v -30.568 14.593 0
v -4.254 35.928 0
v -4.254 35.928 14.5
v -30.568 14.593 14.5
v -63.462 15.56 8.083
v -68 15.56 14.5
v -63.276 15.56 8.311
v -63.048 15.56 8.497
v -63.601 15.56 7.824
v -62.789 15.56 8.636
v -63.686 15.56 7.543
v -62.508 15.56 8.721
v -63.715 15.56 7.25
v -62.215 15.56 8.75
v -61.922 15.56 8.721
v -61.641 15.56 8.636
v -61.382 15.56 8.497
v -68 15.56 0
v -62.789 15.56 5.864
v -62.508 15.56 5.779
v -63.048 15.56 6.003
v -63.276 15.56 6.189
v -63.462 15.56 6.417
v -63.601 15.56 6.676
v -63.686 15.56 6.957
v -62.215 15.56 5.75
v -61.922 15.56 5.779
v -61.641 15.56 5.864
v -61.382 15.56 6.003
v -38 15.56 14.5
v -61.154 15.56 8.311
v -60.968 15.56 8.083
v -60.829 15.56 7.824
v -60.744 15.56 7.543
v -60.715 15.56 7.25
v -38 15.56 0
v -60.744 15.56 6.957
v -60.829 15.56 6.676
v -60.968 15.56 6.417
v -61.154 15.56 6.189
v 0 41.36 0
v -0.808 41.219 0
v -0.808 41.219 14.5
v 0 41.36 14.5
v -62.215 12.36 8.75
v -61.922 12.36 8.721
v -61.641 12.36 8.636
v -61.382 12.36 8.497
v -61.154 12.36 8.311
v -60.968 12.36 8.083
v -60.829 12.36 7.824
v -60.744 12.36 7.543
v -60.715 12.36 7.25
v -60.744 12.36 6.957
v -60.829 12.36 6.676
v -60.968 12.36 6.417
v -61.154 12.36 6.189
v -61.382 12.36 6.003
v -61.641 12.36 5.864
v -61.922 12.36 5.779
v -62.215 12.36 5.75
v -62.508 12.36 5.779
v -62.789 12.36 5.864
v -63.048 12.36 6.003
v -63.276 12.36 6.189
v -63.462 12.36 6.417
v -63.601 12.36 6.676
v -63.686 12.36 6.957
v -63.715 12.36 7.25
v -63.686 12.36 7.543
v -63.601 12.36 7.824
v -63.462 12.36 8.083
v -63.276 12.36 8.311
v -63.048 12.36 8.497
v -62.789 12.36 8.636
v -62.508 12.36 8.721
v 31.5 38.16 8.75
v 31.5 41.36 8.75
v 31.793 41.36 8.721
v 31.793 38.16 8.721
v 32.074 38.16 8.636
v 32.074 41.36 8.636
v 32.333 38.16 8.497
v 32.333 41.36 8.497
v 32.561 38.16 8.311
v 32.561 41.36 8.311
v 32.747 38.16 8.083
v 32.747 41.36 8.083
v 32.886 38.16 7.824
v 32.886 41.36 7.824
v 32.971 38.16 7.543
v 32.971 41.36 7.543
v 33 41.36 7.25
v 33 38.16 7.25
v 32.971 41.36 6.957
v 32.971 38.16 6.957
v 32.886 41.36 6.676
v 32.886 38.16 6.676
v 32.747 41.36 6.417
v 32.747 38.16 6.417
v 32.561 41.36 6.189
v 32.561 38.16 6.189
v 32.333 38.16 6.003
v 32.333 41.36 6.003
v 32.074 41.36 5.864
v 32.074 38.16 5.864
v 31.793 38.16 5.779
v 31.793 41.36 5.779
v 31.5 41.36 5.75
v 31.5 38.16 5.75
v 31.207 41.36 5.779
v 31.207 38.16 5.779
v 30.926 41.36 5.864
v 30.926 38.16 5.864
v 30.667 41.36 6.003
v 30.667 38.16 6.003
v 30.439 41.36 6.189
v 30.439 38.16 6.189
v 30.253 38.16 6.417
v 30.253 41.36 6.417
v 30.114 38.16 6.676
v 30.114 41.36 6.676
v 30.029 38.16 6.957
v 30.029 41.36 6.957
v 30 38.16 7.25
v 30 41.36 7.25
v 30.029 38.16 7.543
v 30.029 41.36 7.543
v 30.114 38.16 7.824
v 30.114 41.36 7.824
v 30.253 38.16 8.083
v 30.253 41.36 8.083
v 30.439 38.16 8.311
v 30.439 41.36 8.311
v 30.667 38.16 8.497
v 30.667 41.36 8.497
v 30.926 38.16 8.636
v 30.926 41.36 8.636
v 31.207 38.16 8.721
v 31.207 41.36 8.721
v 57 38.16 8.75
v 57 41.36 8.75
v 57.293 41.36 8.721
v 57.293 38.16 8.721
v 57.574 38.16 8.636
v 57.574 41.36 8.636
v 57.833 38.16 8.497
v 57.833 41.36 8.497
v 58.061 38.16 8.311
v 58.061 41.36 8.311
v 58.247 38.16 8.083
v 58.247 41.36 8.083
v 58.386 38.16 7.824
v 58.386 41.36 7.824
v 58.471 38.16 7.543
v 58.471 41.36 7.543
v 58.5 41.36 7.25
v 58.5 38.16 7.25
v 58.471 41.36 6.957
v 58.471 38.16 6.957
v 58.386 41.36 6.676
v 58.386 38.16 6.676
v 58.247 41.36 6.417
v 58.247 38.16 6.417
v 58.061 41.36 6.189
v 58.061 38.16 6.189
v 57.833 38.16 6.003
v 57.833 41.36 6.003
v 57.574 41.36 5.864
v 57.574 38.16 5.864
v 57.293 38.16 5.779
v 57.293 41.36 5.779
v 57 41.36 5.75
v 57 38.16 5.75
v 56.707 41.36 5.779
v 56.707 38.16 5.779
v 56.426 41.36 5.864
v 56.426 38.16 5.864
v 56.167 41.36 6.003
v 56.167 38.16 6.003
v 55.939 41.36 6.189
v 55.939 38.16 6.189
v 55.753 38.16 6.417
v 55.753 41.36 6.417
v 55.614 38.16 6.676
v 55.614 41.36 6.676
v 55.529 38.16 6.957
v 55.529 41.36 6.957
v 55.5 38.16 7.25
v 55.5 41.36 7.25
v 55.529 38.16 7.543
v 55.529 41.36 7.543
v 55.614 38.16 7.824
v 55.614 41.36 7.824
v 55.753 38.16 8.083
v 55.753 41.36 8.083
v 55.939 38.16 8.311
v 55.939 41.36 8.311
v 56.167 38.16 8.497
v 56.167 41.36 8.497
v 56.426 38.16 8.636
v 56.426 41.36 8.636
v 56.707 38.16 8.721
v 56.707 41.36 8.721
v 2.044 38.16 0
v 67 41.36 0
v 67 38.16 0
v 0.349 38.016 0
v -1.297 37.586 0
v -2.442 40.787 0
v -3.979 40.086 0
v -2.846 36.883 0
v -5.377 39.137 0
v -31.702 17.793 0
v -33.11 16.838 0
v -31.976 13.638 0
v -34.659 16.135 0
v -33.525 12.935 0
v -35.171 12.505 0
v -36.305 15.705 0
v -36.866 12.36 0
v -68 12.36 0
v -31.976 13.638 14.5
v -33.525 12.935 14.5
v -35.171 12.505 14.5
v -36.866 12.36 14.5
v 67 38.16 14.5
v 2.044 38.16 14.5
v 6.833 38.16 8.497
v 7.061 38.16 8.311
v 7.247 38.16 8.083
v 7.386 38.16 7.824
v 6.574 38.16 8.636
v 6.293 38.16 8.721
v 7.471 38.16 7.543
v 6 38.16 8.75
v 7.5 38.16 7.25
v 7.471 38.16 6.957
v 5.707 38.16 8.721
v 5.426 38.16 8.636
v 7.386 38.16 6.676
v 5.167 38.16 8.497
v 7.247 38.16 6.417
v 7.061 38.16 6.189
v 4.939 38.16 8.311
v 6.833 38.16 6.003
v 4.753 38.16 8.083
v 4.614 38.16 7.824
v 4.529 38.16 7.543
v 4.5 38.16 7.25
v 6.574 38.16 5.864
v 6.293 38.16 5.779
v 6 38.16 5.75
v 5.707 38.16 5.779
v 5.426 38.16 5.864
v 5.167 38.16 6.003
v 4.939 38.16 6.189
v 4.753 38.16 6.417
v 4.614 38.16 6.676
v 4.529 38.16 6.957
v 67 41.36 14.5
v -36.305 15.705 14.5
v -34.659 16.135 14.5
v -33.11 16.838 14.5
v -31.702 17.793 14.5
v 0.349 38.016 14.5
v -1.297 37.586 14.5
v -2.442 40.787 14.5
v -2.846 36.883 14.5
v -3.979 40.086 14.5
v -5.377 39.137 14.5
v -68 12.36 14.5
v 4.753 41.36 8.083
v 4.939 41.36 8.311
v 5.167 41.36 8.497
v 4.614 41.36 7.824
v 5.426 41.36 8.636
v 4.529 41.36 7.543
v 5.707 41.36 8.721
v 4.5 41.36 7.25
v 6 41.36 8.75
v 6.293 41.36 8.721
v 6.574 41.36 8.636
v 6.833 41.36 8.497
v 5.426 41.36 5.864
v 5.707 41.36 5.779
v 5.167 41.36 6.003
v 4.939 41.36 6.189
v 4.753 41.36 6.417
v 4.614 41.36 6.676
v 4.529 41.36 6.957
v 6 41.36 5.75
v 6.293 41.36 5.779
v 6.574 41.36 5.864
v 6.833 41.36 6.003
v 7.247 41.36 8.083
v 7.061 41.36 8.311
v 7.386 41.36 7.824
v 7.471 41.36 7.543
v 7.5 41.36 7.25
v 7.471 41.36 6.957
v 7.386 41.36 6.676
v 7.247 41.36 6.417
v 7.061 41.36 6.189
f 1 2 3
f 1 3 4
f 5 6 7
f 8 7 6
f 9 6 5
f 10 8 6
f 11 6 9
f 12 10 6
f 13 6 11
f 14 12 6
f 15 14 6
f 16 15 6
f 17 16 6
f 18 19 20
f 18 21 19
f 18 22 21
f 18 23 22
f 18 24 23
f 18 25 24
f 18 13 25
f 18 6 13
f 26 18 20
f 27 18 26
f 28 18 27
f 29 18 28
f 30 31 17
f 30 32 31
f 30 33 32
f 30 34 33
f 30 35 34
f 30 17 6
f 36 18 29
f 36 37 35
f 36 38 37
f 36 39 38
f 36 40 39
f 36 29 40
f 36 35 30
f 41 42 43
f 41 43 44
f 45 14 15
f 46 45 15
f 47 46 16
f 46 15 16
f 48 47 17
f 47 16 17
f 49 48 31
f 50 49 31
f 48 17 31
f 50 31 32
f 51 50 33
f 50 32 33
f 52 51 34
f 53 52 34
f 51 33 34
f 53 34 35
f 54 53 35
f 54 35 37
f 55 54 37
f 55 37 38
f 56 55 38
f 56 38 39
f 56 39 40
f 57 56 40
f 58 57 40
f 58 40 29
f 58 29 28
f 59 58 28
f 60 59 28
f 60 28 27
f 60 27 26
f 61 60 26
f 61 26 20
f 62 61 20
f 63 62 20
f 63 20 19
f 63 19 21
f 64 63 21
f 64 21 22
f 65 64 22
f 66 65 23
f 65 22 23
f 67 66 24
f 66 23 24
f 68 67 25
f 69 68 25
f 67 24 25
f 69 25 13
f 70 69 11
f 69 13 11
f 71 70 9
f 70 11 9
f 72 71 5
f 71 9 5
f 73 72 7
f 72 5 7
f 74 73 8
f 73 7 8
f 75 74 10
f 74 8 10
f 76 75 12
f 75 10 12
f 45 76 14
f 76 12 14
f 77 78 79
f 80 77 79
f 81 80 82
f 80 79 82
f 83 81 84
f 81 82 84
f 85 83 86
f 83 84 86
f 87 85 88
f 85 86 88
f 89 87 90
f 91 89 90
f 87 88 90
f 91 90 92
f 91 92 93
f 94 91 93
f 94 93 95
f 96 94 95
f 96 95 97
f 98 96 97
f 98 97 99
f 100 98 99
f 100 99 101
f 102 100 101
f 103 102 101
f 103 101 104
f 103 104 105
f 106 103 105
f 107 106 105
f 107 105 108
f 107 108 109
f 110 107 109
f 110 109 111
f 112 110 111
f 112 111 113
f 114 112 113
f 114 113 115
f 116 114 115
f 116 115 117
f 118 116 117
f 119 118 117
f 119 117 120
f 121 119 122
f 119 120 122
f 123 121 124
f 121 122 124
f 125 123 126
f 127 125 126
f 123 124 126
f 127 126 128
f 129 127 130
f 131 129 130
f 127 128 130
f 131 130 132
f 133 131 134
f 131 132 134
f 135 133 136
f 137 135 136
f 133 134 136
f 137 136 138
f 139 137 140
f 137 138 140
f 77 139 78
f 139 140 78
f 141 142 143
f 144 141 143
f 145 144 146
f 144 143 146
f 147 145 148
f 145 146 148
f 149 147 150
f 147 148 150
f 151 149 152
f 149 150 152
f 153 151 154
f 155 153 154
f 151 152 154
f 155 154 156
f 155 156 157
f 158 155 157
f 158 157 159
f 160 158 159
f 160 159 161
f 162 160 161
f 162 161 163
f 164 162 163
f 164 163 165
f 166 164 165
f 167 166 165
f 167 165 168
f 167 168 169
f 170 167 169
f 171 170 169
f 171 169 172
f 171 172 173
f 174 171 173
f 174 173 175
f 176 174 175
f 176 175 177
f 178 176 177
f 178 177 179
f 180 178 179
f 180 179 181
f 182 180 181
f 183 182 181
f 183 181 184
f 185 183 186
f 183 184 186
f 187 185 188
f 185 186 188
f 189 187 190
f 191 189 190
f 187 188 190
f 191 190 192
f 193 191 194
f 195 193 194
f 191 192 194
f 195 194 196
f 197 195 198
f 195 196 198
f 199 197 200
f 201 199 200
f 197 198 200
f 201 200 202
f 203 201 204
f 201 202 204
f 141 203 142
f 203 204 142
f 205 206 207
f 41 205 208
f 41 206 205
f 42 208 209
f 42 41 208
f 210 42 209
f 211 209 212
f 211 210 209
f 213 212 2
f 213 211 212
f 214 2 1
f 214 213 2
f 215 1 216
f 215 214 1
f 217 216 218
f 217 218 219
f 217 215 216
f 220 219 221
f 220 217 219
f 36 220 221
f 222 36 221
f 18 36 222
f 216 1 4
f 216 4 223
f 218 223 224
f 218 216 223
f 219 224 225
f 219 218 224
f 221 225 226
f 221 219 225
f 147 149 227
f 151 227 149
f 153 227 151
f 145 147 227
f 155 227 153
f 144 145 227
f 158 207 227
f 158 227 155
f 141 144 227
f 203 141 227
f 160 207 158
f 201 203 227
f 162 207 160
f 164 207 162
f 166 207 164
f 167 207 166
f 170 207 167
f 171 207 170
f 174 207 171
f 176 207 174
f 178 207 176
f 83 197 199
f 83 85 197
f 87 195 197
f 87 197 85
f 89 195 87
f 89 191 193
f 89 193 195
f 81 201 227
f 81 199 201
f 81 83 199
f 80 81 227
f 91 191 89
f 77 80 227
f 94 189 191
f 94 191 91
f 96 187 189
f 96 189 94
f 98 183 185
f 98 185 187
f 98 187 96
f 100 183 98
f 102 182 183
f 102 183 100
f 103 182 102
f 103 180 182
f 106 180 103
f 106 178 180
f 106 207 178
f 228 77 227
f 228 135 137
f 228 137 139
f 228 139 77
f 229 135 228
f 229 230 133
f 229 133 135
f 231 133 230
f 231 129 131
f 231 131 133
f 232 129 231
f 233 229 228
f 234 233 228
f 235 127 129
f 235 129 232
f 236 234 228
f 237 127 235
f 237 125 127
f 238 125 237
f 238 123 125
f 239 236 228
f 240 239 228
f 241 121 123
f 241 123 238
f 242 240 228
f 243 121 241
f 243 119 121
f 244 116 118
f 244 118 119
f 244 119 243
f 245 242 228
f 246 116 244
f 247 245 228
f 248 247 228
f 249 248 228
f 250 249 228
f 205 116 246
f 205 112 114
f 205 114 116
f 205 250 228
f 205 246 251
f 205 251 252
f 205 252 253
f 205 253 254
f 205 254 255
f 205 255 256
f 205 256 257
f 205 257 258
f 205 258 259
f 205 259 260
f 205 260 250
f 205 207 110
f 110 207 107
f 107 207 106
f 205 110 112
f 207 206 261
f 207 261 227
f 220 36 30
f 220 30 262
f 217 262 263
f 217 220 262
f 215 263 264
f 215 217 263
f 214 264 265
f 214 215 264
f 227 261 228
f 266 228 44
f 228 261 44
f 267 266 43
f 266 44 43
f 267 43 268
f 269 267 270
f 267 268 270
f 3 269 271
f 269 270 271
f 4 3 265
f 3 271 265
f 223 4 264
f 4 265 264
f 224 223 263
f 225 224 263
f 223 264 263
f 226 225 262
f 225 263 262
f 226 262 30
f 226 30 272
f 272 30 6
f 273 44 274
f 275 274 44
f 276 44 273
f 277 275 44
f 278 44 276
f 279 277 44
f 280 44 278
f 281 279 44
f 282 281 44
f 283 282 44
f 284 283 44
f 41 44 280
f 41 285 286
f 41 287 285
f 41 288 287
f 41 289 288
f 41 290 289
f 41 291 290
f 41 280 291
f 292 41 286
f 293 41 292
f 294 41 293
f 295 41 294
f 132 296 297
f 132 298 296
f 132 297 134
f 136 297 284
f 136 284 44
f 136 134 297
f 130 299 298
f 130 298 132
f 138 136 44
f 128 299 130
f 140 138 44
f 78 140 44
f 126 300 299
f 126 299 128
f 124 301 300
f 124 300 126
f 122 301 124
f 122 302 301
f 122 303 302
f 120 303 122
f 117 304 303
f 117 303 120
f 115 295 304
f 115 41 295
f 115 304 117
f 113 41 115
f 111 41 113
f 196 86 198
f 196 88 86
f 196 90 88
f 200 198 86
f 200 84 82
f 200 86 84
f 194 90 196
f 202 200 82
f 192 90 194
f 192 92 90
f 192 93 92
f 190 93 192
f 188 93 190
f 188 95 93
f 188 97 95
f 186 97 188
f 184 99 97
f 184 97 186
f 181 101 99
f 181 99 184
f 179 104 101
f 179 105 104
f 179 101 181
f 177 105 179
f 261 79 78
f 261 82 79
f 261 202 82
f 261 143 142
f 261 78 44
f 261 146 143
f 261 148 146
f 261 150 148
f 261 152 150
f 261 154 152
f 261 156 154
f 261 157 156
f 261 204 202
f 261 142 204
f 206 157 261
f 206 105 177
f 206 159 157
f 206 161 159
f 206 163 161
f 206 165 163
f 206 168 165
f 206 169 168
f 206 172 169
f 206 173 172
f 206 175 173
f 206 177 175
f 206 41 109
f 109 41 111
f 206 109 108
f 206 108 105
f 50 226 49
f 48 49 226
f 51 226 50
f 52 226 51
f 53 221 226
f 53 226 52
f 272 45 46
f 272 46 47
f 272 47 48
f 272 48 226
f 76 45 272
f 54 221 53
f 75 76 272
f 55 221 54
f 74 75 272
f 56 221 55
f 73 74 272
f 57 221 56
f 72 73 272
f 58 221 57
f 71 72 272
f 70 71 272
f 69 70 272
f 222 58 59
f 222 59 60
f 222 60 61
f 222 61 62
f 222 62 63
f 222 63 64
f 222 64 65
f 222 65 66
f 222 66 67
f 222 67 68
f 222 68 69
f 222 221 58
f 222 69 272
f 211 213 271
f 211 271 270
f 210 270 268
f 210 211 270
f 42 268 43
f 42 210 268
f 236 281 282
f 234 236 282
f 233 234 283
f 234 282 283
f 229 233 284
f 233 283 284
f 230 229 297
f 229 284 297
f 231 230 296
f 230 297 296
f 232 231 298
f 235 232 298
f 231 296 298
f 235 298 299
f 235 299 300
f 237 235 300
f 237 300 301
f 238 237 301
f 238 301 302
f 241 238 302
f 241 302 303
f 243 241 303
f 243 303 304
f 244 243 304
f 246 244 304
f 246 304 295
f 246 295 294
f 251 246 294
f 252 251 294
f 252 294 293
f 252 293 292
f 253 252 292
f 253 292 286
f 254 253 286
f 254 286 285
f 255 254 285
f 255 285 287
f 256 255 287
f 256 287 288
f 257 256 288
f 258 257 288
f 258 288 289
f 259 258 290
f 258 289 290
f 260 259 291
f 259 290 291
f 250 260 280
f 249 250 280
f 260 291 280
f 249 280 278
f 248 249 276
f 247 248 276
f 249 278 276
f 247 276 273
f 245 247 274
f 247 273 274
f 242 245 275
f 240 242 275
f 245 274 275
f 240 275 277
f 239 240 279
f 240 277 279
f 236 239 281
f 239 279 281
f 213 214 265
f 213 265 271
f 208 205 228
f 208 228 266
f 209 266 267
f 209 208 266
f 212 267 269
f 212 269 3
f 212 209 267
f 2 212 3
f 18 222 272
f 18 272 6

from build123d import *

# Parameters (mm, degrees)
BOSS_EXTRUDE1_DEPTH = 14.5
SKETCH3_R           = 1.5
CUT_EXTRUDE1_DEPTH  = 76.334255157


with BuildPart() as part:
    # Sketch2 → Boss-Extrude1 (new body)
    with BuildSketch(Plane.XY):
        with BuildLine():
            Line((0, 41.360359775), (67, 41.360359775))
            Line((67, 41.360359775), (67, 38.160359775))
            Line((67, 38.160359775), (2.044161335, 38.160359775))
            ThreePointArc((2.044161335, 38.160359775), (-1.29678146, 37.585756385), (-4.253780843, 35.927980024))
            Line((-4.253780843, 35.927980024), (-30.567780148, 14.592739527))
            ThreePointArc((-30.567780148, 14.592739527), (-33.524779531, 12.934963166), (-36.865722326, 12.360359775))
            Line((-36.865722326, 12.360359775), (-68, 12.360359775))
            Line((-68, 12.360359775), (-68, 15.560359775))
            Line((-68, 15.560359775), (-38, 15.560359775))
            ThreePointArc((-38, 15.560359775), (-34.659057205, 16.134963166), (-31.702057822, 17.792739527))
            Line((-31.702057822, 17.792739527), (-5.377247568, 39.13674548))
            ThreePointArc((-5.377247568, 39.13674548), (-3.225270493, 40.469178713), (-0.807686987, 41.218627608))
            Line((-0.807686987, 41.218627608), (0, 41.360359775))
        make_face()
    extrude(amount=BOSS_EXTRUDE1_DEPTH)

    # Sketch3 → Cut-Extrude1 (cut, through all)
    with BuildSketch(Plane(origin=(0, 41.360359775, 0), x_dir=(1, 0, 0), z_dir=(0, 1, 0))):
        with Locations(Location((6, -7.25, 0), (0, 0, 270))):
            Circle(SKETCH3_R)
        with Locations(Location((31.5, -7.25, 0), (0, 0, 270))):
            Circle(SKETCH3_R)
        with Locations(Location((57, -7.25, 0), (0, 0, 270))):
            Circle(SKETCH3_R)
        with Locations(Location((-62.214915759, -7.25, 0), (0, 0, 270))):
            Circle(SKETCH3_R)
    extrude(amount=-CUT_EXTRUDE1_DEPTH, mode=Mode.SUBTRACT)


solid = part.part
